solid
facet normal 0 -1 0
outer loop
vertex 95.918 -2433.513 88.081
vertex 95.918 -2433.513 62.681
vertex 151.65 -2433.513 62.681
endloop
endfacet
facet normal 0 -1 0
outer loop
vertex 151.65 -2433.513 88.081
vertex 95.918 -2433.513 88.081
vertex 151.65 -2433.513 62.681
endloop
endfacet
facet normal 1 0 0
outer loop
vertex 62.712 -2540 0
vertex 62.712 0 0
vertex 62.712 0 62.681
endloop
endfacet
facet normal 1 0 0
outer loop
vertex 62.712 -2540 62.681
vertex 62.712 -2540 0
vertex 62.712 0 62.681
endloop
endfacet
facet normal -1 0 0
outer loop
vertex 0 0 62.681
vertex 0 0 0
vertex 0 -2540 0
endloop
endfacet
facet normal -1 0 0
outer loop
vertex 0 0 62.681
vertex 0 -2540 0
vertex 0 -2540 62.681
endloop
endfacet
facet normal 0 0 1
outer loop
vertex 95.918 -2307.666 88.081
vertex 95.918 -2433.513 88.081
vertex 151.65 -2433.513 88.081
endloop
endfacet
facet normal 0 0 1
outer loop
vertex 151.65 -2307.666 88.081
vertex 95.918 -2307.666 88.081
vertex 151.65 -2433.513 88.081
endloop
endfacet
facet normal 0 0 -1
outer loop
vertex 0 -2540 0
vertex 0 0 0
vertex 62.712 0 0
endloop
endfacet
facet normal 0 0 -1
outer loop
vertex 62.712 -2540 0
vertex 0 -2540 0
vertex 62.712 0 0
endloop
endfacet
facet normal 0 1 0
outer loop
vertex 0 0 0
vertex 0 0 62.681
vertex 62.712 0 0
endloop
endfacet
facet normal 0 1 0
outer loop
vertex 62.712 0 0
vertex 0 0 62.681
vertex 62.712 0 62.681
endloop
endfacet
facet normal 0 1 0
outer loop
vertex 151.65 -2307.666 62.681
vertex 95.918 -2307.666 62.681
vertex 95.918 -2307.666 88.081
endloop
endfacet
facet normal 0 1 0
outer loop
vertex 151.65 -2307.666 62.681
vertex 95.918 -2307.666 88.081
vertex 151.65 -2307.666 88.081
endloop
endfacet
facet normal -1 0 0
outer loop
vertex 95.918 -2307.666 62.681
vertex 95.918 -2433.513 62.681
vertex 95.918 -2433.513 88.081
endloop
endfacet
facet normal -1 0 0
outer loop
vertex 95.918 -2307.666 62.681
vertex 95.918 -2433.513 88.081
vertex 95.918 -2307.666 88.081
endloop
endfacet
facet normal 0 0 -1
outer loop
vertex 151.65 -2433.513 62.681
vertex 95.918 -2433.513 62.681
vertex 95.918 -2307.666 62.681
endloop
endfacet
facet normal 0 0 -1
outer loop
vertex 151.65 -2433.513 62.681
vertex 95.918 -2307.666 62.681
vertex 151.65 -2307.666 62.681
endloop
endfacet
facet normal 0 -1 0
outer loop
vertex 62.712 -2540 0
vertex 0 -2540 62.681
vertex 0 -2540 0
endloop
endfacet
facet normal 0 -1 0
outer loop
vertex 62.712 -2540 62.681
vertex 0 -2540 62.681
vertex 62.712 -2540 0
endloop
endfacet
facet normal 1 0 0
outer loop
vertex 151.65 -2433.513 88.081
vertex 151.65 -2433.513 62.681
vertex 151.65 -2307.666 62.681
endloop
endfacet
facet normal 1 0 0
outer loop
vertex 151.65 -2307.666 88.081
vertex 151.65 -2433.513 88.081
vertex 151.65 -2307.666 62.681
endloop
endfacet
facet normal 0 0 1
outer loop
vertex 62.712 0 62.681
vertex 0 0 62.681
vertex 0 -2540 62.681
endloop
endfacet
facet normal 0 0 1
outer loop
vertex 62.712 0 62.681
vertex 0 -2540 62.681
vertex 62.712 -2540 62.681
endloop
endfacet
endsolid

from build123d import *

# Parameters (mm, degrees)
F0_W     = 62.712416
F0_H     = 62.681198
F1_DEPTH = 2540
F2_W     = 55.731669
F2_H     = 125.846386
F3_DEPTH = 25.4


with BuildPart() as f1:
    # F0 (on Front) → F1 (new body)
    with BuildSketch(Plane.XZ):
        with Locations((31.356208, 31.340599)):
            Rectangle(F0_W, F0_H)
    extrude(amount=F1_DEPTH)


with BuildPart() as f3:
    # F2 (on face) → F3 (new body)
    with BuildSketch(Plane.XY.offset(62.681198)):
        with Locations((123.783774, -2370.589495)):
            Rectangle(F2_W, F2_H)
    extrude(amount=F3_DEPTH)


solid = Compound([f1.part, f3.part])
